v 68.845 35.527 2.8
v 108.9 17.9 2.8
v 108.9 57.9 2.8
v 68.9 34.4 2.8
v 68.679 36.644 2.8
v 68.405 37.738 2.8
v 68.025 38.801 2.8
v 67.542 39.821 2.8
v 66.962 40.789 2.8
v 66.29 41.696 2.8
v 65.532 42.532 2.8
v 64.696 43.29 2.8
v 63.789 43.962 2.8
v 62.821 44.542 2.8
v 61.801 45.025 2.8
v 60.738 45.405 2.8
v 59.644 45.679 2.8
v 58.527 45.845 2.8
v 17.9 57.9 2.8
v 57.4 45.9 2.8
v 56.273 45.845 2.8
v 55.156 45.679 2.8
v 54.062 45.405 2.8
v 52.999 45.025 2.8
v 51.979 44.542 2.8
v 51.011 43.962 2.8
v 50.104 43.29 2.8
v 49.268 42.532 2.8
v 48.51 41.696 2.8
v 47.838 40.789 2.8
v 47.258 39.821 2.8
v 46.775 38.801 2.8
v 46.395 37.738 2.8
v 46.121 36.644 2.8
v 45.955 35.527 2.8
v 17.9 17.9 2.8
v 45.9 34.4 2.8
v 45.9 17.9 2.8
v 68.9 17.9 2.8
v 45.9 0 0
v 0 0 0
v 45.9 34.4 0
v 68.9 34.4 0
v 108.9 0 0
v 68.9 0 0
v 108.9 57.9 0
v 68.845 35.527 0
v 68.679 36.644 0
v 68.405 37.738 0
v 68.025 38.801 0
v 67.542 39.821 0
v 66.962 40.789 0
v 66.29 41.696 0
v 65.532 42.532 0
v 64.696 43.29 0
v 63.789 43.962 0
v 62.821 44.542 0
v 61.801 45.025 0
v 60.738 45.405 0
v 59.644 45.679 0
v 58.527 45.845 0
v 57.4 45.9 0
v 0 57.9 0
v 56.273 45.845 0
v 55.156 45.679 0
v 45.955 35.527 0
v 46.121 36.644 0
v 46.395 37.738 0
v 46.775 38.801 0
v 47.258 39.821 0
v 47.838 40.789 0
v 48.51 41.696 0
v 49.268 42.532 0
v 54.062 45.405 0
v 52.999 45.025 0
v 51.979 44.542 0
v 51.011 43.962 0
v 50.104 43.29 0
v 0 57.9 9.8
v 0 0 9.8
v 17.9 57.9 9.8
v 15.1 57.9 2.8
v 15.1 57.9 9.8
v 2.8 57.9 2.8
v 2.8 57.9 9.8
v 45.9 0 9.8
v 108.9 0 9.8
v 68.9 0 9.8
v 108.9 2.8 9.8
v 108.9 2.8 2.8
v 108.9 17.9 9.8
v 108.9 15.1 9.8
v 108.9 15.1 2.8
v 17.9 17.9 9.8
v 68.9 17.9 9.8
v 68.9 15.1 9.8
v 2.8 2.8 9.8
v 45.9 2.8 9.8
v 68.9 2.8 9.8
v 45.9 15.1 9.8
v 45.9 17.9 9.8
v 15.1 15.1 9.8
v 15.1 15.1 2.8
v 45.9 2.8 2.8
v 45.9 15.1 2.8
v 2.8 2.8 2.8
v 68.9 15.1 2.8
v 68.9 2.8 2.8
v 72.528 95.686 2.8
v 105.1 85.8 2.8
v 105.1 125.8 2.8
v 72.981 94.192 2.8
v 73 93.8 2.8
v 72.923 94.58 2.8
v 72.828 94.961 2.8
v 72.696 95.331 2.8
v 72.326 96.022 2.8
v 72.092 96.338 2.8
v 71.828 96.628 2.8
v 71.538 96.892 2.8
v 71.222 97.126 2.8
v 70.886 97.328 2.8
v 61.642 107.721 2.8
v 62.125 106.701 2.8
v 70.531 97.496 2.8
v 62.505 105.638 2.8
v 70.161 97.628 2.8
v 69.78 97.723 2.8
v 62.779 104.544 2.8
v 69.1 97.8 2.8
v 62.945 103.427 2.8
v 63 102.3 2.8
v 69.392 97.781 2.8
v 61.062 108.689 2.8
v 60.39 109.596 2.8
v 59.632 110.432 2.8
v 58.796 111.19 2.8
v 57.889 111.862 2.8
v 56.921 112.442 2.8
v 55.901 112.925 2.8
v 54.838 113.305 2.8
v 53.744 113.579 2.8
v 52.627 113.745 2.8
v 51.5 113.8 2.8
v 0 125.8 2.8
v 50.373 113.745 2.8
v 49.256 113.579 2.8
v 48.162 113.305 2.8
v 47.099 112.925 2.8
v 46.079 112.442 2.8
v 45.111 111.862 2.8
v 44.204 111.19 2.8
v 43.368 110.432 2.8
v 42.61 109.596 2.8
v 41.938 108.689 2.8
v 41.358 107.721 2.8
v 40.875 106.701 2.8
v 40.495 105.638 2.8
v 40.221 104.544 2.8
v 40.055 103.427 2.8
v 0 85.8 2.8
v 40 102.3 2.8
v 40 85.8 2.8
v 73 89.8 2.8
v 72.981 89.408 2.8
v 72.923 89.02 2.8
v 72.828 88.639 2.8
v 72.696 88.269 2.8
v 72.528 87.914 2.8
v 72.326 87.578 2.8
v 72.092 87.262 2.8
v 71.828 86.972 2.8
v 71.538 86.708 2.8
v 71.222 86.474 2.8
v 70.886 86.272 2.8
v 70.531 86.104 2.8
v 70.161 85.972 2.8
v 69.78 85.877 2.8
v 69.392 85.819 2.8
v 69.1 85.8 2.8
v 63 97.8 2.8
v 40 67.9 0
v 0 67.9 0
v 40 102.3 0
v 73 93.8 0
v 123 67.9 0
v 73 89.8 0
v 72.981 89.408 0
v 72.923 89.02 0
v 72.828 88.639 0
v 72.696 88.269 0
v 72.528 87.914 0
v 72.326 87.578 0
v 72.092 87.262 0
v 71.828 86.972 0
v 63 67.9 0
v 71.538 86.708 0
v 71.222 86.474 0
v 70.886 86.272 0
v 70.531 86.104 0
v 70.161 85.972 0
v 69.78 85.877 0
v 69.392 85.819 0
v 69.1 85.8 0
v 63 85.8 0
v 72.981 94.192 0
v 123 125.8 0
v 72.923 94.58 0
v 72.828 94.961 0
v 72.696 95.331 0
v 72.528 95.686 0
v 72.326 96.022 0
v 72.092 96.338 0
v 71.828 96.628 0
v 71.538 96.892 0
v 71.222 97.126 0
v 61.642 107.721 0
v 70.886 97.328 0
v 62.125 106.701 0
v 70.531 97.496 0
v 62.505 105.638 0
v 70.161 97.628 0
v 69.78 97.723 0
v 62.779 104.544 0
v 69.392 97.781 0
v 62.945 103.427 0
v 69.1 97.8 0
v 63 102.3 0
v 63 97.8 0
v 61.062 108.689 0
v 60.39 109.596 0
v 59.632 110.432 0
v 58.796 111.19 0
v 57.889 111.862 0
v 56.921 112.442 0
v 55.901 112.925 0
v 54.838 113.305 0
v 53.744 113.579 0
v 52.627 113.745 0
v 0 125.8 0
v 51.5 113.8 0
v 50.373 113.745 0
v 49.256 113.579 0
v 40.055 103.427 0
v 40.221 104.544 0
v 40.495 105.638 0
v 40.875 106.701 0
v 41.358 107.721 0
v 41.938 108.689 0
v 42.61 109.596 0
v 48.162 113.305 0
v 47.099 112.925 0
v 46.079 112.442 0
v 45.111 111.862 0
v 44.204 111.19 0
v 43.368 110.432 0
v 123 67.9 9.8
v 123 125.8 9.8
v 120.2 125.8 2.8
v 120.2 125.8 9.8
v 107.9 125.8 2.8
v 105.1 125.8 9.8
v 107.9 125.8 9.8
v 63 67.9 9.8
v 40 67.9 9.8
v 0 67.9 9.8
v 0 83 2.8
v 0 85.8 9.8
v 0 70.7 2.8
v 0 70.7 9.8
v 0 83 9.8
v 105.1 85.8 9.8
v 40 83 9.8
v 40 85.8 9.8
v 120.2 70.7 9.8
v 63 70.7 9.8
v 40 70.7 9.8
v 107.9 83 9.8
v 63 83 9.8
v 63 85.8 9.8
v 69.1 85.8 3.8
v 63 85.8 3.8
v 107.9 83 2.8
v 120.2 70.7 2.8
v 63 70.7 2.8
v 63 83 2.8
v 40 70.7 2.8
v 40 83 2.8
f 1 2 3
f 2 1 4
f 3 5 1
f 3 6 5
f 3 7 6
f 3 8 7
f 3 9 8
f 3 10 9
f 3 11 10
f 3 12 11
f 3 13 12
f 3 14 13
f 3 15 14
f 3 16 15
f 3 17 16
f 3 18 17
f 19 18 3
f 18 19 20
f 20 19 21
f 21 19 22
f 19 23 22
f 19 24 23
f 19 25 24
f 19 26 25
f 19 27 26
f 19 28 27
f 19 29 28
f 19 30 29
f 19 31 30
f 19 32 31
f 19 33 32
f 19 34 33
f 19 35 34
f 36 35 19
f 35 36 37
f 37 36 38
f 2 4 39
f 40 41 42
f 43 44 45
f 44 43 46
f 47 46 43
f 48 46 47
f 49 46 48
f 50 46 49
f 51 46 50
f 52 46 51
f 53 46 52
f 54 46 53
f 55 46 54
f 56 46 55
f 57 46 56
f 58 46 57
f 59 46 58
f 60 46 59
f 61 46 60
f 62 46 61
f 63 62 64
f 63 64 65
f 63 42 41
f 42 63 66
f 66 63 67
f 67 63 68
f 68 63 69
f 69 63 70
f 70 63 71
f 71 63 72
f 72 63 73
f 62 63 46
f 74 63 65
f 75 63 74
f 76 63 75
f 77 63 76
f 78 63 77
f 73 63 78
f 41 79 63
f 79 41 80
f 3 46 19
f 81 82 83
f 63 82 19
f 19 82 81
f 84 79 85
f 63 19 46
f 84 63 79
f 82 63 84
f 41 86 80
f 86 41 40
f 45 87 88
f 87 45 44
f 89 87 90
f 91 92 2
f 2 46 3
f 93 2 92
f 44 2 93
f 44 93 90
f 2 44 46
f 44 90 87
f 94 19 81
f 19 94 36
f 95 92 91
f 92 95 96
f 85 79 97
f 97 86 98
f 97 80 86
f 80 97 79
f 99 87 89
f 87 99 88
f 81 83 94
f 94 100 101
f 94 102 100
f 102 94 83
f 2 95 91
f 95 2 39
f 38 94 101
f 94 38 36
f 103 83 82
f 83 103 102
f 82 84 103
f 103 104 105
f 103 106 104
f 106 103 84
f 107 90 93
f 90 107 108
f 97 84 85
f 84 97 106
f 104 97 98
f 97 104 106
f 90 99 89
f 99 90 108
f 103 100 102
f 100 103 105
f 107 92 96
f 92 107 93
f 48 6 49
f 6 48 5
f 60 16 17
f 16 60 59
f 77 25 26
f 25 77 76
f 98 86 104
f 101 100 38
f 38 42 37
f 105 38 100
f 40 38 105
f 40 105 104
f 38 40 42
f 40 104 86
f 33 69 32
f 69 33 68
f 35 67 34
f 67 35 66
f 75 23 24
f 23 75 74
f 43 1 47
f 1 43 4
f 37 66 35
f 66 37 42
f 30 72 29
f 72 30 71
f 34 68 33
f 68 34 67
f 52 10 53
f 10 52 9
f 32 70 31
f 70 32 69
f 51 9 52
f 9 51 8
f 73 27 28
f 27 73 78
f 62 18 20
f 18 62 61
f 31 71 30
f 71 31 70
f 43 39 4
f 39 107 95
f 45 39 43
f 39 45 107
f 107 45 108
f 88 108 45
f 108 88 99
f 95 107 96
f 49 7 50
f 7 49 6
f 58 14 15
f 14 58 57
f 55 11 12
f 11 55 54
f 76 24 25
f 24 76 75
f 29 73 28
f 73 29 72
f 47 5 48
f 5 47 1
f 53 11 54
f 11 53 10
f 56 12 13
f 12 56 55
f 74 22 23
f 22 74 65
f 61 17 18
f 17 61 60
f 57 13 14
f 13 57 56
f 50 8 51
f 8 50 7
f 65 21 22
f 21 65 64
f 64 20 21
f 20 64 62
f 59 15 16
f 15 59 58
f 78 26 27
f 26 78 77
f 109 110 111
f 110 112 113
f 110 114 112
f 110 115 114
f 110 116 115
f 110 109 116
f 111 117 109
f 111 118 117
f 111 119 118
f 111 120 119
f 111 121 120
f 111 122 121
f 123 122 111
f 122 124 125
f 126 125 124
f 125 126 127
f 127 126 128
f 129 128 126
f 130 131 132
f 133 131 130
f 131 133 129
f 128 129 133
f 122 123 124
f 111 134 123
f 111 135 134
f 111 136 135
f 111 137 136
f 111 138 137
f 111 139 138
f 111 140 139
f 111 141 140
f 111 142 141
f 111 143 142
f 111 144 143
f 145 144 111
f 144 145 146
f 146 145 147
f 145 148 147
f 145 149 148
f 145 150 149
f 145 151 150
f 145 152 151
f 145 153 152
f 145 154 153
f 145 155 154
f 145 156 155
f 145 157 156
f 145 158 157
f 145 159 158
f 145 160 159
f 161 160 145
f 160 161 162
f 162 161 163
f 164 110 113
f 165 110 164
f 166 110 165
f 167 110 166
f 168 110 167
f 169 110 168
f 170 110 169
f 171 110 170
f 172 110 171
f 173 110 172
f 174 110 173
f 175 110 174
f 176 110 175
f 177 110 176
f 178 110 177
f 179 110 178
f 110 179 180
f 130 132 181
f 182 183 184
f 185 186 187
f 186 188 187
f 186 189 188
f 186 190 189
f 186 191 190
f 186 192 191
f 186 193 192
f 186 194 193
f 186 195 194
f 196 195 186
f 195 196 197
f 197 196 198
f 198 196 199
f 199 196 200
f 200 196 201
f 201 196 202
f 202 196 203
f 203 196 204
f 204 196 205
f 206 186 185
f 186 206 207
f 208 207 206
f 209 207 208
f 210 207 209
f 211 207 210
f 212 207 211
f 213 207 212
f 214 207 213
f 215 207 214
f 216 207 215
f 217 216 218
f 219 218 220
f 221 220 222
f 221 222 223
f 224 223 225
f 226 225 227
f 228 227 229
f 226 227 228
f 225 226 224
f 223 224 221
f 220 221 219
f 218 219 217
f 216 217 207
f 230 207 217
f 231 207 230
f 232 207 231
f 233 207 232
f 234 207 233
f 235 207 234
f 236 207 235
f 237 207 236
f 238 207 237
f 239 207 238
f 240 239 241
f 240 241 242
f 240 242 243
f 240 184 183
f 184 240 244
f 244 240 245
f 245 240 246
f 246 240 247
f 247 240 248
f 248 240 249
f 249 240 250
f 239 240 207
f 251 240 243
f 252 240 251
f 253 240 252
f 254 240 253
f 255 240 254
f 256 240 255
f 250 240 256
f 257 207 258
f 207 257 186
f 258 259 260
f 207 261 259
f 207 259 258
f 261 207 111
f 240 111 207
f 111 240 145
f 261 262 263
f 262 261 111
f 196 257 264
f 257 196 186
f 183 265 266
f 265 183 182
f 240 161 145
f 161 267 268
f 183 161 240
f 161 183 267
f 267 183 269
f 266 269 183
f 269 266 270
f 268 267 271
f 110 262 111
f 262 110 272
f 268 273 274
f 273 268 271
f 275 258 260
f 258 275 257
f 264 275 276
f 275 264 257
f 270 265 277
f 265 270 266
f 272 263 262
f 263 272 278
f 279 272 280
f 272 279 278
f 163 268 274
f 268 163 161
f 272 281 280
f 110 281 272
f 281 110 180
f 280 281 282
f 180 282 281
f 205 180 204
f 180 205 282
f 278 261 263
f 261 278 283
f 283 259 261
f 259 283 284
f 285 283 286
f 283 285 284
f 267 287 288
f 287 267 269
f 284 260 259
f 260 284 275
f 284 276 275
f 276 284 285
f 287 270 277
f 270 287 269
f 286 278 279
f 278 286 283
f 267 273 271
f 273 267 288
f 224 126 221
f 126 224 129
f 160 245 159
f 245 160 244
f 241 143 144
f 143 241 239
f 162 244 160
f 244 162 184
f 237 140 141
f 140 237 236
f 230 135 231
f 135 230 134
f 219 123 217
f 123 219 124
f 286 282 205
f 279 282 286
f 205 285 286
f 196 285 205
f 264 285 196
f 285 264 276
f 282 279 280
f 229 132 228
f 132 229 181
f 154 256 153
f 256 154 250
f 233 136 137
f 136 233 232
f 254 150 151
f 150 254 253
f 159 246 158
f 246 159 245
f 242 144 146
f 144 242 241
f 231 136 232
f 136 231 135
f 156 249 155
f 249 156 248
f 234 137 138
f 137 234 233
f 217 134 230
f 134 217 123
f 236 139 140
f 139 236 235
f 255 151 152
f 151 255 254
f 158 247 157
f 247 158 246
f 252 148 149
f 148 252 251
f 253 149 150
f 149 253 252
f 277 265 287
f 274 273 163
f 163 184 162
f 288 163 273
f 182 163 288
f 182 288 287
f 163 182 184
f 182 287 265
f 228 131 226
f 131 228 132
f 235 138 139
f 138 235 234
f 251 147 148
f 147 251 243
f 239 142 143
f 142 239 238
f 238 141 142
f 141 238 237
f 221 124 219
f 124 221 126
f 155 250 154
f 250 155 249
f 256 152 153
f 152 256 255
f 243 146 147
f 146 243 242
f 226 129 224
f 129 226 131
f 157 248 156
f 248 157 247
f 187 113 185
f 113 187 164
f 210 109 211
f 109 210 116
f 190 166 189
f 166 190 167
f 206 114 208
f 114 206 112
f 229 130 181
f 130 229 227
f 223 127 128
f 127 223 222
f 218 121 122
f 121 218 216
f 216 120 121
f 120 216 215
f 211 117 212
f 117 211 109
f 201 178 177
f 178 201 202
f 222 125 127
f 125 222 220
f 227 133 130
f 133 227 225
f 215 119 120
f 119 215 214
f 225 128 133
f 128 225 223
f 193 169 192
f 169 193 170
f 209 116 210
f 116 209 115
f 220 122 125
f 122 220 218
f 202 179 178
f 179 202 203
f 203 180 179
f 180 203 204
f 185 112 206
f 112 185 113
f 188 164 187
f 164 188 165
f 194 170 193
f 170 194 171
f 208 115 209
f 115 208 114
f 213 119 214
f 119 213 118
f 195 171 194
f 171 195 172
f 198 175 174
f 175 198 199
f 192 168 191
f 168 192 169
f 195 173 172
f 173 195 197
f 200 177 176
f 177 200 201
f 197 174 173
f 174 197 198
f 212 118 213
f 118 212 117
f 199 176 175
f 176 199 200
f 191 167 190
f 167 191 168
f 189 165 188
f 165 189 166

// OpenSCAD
/*
  Aquarium Shrimp Escape Guard
  ----------------------------
  A corner cover for the top rim of an aquarium. It clips onto the back glass
  and the side glass at a corner, and a flat ledge reaches into the tank along
  both glasses, so shrimp (e.g. Amano shrimp) climbing up the glass or the
  filter pipe cannot get over the rim. A U-shaped cutout fits around the
  filter pipe (inlet or outlet) where it comes over the glass.

  Two guards, one per back corner:
    - Left guard  - for the filter intake pipe.
    - Right guard - for the filter outlet pipe, the mirror image of the left
      one, with an extra hole for two power cables (heater, skimmer) joined
      to the pipe cutout.

  All dimensions in millimetres.
  Coordinate system (left guard, as printed):
  - The corner of the aquarium is at the origin.
  - X runs along the back glass, Y along the side glass.
  - The inside of the tank is towards +Y (back glass) and +X (side glass).
  - Z = 0 is the top plate, lying on the build plate; the clip walls rise
    from it (they hang down over the glass when the guard is mounted).
  Distances "from the corner" or "from the glass" are measured from the
  inner face of the clip, so changing the glass clearance widens the clip
  outwards and does not move the pipe cutout.

  Usage: choose `part`, render (F6) and export the STL (F7).
  Ready-made STLs for the default dimensions are in the stl/ folder.
  The console prints the main dimensions of each guard.
*/

/* [Part] */
part = "both";              // [left:Left guard (intake), right:Right guard (outlet), both:Both guards]
layout_gap = 10;            // Gap between the guards when part = "both" [mm]

/* [Glass clip] */
glass_thickness = 10;       // Thickness of the aquarium glass [mm]
glass_clearance = 2.3;      // Extra slot width: 0.3 mm fit + 2 mm for print tolerance [mm]
wall_thickness = 2.8;       // Clip walls and top plate [mm]
clip_height = 7;            // How far the clip walls reach down over the glass [mm]

/* [Ledge] */
ledge_width = 40;           // How far the flat ledge reaches into the tank [mm]
loop_width = 10;            // Width of the strap that forms the U around the pipe [mm]

/* [Left guard - intake pipe] */
left_side_arm_length = 40;          // Arm along the side glass, from the back clip [mm]
left_pipe_offset = 28;              // Corner to the pipe cutout, from the side clip [mm]
left_length_after_pipe = 40;        // Back arm past the pipe cutout [mm]
left_pipe_width = 23;               // Width of the pipe cutout along the glass [mm]
left_pipe_protrusion = 28;          // How far the pipe elbow reaches into the tank [mm]

/* [Right guard - outlet pipe] */
right_side_arm_length = 40;         // Arm along the side glass, from the back clip [mm]
// Corner to the pipe cutout, from the side clip [mm].
// 42.1 + 17.9 mm clip = 60 mm from the outer corner (see the console).
right_pipe_offset = 42.1;
right_length_after_pipe = 40;       // Back arm past the pipe cutout [mm]
right_pipe_width = 23;              // Width of the pipe cutout along the glass [mm]
right_pipe_protrusion = 28;         // How far the pipe elbow reaches into the tank [mm]

/* [Right guard - cable hole] */
right_cable_hole = true;            // Hole for two 2-core power cables (heater, skimmer)
right_cable_side = "before";        // [before:Between corner and pipe, after:Past the pipe]
right_cable_width = 8;              // Size of the hole along the glass [mm]
right_cable_depth = 12;             // Size of the hole into the tank [mm]
right_cable_gap = 2;                // Distance from the hole to the pipe cutout [mm]
right_cable_offset = 0;             // Distance from the inner clip wall (0 = touching) [mm]
right_cable_merge = true;           // Join the hole to the pipe cutout (one opening)

/* [Quality] */
$fn = 64;

/* [Hidden] */
eps = 0.1;                  // Overlap for clean boolean cuts

// ============================================================================
// DERIVED VALUES (shared by both guards)
// ============================================================================

slot_width  = glass_thickness + glass_clearance;    // Glass slot
clip_width  = wall_thickness + slot_width + wall_thickness;
clip_total  = wall_thickness + clip_height;         // Clip height incl. top plate
ledge_total = clip_width + ledge_width;             // Clip + ledge
glass_inner = wall_thickness + slot_width;          // Inner face of the glass slot

// Length of the back arm (along X)
function guard_length(pipe_offset, pipe_width, length_after_pipe) =
    clip_width + pipe_offset + pipe_width + length_after_pipe;

// Depth of the guard (along Y), used to lay out both guards
function guard_depth(side_arm_length, pipe_protrusion) =
    max(clip_width + side_arm_length, ledge_total,
        clip_width + pipe_protrusion + loop_width);

// ============================================================================
// INPUT CHECKS
// ============================================================================

assert(glass_clearance >= 0, "glass_clearance must not be negative");
assert(right_cable_side == "before" || right_cable_side == "after",
       "right_cable_side must be \"before\" or \"after\"");
assert(right_cable_width > 0 && right_cable_depth > 0,
       "The cable hole needs a positive width and depth");

// ============================================================================
// MODULES
// ============================================================================

// Stadium-shaped cable hole (fully rounded ends) through the top plate, next
// to the inner clip wall. The clip over the glass stays intact: the cables run
// over the top of the guard and drop into the tank through the hole.
// join_x (optional) = edge of the pipe cutout; the hole is then joined to it by
// a strip of the full hole depth, forming one opening.
module cable_hole_cut(x0, y0, width, depth, join_x = undef) {
    r  = min(width, depth) / 2;
    cx = x0 + width / 2;
    hull() {
        for (p = [[x0 + r, y0 + r], [x0 + width - r, y0 + depth - r]])
            translate([p[0], p[1], -1])
                cylinder(r = r, h = wall_thickness + 2);
        if (!is_undef(join_x))
            translate([min(cx, join_x) - eps, y0, -1])
                cube([abs(join_x - cx) + 2 * eps, depth, wall_thickness + 2]);
    }
}

// One corner guard in the left-hand orientation.
// cable = undef for no cable hole, or
//         [width, depth, gap, side, offset, merge] (see the right guard).
module corner_guard(side_arm_length, pipe_offset, length_after_pipe,
                    pipe_width, pipe_protrusion, cable = undef) {
    side_len  = clip_width + side_arm_length;                 // Side arm (Y)
    back_len  = guard_length(pipe_offset, pipe_width, length_after_pipe);
    pipe_x0   = clip_width + pipe_offset;                     // Pipe cutout start
    pipe_x1   = pipe_x0 + pipe_width;                         // Pipe cutout end
    pipe_cx   = pipe_x0 + pipe_width / 2;                     // Pipe cutout centre
    u_cy      = clip_width + pipe_protrusion - pipe_width / 2; // Centre of the U end

    has_cable = !is_undef(cable);
    cable_x0  = !has_cable ? 0
              : cable[3] == "before" ? pipe_x0 - cable[2] - cable[0]
              :                        pipe_x1 + cable[2];
    cable_y0  = has_cable ? clip_width + cable[4] : 0;

    if (has_cable) {
        assert(cable_x0 >= clip_width + 3 && cable_x0 + cable[0] <= back_len - 3,
               "The cable hole does not fit in the back arm - change its side or size");
        assert(cable_y0 + cable[1] <= ledge_total - 3,
               "The cable hole reaches past the ledge - reduce its depth or offset");
    }

    difference() {
        union() {
            // A. Top plate with the ledge (Z = 0 .. wall_thickness)
            cube([ledge_total, side_len, wall_thickness]);    // Side arm
            cube([back_len, ledge_total, wall_thickness]);    // Back arm

            // U-shaped loop around the pipe, merged into the ledge
            hull() {
                translate([pipe_x0 - loop_width, clip_width - wall_thickness, 0])
                    cube([pipe_width + 2 * loop_width, ledge_width + wall_thickness,
                          wall_thickness]);
                translate([pipe_cx, u_cy, 0])
                    cylinder(d = pipe_width + 2 * loop_width, h = wall_thickness);
            }

            // B. Solid clip blocks (the glass slot is cut below)
            cube([clip_width, side_len, clip_total]);         // Side arm
            cube([back_len, clip_width, clip_total]);         // Back arm
        }

        // C. Continuous L-shaped glass slot, open in the corner
        translate([wall_thickness, wall_thickness, wall_thickness]) {
            cube([slot_width, side_len, clip_total]);
            cube([back_len, slot_width, clip_total]);
        }

        // D. Pipe cutout in the ledge, from the glass to the end of the U
        hull() {
            translate([pipe_x0, glass_inner - eps, -1])
                cube([pipe_width, wall_thickness + 1, wall_thickness + 2]);
            translate([pipe_cx, u_cy, -1])
                cylinder(d = pipe_width, h = wall_thickness + 2);
        }

        // E. Pipe passage over the glass (removes both clip walls there)
        translate([pipe_x0, -1, -1])
            cube([pipe_width, 1 + clip_width + eps, clip_total + 2]);

        // F. Cable hole (optional)
        if (has_cable)
            cable_hole_cut(cable_x0, cable_y0, cable[0], cable[1],
                           join_x = !cable[5]            ? undef
                                  : cable[3] == "before" ? pipe_x0
                                  :                        pipe_x1);
    }
}

module left_guard() {
    corner_guard(left_side_arm_length, left_pipe_offset, left_length_after_pipe,
                 left_pipe_width, left_pipe_protrusion);
}

// Mirror image of the left guard, moved back to X >= 0
module right_guard() {
    cable = right_cable_hole
          ? [right_cable_width, right_cable_depth, right_cable_gap,
             right_cable_side, right_cable_offset, right_cable_merge]
          : undef;
    translate([guard_length(right_pipe_offset, right_pipe_width,
                            right_length_after_pipe), 0, 0])
        mirror([1, 0, 0])
            corner_guard(right_side_arm_length, right_pipe_offset,
                         right_length_after_pipe, right_pipe_width,
                         right_pipe_protrusion, cable);
}

// ============================================================================
// CONSOLE REPORT
// ============================================================================

module report(name, side_arm_length, pipe_offset, length_after_pipe,
              pipe_width, pipe_protrusion) {
    echo(str(name, ": ",
             guard_length(pipe_offset, pipe_width, length_after_pipe), " x ",
             guard_depth(side_arm_length, pipe_protrusion), " x ",
             clip_total, " mm, outer corner to pipe cutout = ",
             clip_width + pipe_offset, " mm"));
}

echo(str("Glass slot = ", slot_width, " mm, clip width = ", clip_width, " mm"));
if (part != "right")
    report("Left guard", left_side_arm_length, left_pipe_offset,
           left_length_after_pipe, left_pipe_width, left_pipe_protrusion);
if (part != "left")
    report("Right guard", right_side_arm_length, right_pipe_offset,
           right_length_after_pipe, right_pipe_width, right_pipe_protrusion);

// ============================================================================
// RENDER
// ============================================================================

if (part == "left") {
    left_guard();
} else if (part == "right") {
    right_guard();
} else {
    left_guard();
    translate([0, guard_depth(left_side_arm_length, left_pipe_protrusion)
                  + layout_gap, 0])
        right_guard();
}
